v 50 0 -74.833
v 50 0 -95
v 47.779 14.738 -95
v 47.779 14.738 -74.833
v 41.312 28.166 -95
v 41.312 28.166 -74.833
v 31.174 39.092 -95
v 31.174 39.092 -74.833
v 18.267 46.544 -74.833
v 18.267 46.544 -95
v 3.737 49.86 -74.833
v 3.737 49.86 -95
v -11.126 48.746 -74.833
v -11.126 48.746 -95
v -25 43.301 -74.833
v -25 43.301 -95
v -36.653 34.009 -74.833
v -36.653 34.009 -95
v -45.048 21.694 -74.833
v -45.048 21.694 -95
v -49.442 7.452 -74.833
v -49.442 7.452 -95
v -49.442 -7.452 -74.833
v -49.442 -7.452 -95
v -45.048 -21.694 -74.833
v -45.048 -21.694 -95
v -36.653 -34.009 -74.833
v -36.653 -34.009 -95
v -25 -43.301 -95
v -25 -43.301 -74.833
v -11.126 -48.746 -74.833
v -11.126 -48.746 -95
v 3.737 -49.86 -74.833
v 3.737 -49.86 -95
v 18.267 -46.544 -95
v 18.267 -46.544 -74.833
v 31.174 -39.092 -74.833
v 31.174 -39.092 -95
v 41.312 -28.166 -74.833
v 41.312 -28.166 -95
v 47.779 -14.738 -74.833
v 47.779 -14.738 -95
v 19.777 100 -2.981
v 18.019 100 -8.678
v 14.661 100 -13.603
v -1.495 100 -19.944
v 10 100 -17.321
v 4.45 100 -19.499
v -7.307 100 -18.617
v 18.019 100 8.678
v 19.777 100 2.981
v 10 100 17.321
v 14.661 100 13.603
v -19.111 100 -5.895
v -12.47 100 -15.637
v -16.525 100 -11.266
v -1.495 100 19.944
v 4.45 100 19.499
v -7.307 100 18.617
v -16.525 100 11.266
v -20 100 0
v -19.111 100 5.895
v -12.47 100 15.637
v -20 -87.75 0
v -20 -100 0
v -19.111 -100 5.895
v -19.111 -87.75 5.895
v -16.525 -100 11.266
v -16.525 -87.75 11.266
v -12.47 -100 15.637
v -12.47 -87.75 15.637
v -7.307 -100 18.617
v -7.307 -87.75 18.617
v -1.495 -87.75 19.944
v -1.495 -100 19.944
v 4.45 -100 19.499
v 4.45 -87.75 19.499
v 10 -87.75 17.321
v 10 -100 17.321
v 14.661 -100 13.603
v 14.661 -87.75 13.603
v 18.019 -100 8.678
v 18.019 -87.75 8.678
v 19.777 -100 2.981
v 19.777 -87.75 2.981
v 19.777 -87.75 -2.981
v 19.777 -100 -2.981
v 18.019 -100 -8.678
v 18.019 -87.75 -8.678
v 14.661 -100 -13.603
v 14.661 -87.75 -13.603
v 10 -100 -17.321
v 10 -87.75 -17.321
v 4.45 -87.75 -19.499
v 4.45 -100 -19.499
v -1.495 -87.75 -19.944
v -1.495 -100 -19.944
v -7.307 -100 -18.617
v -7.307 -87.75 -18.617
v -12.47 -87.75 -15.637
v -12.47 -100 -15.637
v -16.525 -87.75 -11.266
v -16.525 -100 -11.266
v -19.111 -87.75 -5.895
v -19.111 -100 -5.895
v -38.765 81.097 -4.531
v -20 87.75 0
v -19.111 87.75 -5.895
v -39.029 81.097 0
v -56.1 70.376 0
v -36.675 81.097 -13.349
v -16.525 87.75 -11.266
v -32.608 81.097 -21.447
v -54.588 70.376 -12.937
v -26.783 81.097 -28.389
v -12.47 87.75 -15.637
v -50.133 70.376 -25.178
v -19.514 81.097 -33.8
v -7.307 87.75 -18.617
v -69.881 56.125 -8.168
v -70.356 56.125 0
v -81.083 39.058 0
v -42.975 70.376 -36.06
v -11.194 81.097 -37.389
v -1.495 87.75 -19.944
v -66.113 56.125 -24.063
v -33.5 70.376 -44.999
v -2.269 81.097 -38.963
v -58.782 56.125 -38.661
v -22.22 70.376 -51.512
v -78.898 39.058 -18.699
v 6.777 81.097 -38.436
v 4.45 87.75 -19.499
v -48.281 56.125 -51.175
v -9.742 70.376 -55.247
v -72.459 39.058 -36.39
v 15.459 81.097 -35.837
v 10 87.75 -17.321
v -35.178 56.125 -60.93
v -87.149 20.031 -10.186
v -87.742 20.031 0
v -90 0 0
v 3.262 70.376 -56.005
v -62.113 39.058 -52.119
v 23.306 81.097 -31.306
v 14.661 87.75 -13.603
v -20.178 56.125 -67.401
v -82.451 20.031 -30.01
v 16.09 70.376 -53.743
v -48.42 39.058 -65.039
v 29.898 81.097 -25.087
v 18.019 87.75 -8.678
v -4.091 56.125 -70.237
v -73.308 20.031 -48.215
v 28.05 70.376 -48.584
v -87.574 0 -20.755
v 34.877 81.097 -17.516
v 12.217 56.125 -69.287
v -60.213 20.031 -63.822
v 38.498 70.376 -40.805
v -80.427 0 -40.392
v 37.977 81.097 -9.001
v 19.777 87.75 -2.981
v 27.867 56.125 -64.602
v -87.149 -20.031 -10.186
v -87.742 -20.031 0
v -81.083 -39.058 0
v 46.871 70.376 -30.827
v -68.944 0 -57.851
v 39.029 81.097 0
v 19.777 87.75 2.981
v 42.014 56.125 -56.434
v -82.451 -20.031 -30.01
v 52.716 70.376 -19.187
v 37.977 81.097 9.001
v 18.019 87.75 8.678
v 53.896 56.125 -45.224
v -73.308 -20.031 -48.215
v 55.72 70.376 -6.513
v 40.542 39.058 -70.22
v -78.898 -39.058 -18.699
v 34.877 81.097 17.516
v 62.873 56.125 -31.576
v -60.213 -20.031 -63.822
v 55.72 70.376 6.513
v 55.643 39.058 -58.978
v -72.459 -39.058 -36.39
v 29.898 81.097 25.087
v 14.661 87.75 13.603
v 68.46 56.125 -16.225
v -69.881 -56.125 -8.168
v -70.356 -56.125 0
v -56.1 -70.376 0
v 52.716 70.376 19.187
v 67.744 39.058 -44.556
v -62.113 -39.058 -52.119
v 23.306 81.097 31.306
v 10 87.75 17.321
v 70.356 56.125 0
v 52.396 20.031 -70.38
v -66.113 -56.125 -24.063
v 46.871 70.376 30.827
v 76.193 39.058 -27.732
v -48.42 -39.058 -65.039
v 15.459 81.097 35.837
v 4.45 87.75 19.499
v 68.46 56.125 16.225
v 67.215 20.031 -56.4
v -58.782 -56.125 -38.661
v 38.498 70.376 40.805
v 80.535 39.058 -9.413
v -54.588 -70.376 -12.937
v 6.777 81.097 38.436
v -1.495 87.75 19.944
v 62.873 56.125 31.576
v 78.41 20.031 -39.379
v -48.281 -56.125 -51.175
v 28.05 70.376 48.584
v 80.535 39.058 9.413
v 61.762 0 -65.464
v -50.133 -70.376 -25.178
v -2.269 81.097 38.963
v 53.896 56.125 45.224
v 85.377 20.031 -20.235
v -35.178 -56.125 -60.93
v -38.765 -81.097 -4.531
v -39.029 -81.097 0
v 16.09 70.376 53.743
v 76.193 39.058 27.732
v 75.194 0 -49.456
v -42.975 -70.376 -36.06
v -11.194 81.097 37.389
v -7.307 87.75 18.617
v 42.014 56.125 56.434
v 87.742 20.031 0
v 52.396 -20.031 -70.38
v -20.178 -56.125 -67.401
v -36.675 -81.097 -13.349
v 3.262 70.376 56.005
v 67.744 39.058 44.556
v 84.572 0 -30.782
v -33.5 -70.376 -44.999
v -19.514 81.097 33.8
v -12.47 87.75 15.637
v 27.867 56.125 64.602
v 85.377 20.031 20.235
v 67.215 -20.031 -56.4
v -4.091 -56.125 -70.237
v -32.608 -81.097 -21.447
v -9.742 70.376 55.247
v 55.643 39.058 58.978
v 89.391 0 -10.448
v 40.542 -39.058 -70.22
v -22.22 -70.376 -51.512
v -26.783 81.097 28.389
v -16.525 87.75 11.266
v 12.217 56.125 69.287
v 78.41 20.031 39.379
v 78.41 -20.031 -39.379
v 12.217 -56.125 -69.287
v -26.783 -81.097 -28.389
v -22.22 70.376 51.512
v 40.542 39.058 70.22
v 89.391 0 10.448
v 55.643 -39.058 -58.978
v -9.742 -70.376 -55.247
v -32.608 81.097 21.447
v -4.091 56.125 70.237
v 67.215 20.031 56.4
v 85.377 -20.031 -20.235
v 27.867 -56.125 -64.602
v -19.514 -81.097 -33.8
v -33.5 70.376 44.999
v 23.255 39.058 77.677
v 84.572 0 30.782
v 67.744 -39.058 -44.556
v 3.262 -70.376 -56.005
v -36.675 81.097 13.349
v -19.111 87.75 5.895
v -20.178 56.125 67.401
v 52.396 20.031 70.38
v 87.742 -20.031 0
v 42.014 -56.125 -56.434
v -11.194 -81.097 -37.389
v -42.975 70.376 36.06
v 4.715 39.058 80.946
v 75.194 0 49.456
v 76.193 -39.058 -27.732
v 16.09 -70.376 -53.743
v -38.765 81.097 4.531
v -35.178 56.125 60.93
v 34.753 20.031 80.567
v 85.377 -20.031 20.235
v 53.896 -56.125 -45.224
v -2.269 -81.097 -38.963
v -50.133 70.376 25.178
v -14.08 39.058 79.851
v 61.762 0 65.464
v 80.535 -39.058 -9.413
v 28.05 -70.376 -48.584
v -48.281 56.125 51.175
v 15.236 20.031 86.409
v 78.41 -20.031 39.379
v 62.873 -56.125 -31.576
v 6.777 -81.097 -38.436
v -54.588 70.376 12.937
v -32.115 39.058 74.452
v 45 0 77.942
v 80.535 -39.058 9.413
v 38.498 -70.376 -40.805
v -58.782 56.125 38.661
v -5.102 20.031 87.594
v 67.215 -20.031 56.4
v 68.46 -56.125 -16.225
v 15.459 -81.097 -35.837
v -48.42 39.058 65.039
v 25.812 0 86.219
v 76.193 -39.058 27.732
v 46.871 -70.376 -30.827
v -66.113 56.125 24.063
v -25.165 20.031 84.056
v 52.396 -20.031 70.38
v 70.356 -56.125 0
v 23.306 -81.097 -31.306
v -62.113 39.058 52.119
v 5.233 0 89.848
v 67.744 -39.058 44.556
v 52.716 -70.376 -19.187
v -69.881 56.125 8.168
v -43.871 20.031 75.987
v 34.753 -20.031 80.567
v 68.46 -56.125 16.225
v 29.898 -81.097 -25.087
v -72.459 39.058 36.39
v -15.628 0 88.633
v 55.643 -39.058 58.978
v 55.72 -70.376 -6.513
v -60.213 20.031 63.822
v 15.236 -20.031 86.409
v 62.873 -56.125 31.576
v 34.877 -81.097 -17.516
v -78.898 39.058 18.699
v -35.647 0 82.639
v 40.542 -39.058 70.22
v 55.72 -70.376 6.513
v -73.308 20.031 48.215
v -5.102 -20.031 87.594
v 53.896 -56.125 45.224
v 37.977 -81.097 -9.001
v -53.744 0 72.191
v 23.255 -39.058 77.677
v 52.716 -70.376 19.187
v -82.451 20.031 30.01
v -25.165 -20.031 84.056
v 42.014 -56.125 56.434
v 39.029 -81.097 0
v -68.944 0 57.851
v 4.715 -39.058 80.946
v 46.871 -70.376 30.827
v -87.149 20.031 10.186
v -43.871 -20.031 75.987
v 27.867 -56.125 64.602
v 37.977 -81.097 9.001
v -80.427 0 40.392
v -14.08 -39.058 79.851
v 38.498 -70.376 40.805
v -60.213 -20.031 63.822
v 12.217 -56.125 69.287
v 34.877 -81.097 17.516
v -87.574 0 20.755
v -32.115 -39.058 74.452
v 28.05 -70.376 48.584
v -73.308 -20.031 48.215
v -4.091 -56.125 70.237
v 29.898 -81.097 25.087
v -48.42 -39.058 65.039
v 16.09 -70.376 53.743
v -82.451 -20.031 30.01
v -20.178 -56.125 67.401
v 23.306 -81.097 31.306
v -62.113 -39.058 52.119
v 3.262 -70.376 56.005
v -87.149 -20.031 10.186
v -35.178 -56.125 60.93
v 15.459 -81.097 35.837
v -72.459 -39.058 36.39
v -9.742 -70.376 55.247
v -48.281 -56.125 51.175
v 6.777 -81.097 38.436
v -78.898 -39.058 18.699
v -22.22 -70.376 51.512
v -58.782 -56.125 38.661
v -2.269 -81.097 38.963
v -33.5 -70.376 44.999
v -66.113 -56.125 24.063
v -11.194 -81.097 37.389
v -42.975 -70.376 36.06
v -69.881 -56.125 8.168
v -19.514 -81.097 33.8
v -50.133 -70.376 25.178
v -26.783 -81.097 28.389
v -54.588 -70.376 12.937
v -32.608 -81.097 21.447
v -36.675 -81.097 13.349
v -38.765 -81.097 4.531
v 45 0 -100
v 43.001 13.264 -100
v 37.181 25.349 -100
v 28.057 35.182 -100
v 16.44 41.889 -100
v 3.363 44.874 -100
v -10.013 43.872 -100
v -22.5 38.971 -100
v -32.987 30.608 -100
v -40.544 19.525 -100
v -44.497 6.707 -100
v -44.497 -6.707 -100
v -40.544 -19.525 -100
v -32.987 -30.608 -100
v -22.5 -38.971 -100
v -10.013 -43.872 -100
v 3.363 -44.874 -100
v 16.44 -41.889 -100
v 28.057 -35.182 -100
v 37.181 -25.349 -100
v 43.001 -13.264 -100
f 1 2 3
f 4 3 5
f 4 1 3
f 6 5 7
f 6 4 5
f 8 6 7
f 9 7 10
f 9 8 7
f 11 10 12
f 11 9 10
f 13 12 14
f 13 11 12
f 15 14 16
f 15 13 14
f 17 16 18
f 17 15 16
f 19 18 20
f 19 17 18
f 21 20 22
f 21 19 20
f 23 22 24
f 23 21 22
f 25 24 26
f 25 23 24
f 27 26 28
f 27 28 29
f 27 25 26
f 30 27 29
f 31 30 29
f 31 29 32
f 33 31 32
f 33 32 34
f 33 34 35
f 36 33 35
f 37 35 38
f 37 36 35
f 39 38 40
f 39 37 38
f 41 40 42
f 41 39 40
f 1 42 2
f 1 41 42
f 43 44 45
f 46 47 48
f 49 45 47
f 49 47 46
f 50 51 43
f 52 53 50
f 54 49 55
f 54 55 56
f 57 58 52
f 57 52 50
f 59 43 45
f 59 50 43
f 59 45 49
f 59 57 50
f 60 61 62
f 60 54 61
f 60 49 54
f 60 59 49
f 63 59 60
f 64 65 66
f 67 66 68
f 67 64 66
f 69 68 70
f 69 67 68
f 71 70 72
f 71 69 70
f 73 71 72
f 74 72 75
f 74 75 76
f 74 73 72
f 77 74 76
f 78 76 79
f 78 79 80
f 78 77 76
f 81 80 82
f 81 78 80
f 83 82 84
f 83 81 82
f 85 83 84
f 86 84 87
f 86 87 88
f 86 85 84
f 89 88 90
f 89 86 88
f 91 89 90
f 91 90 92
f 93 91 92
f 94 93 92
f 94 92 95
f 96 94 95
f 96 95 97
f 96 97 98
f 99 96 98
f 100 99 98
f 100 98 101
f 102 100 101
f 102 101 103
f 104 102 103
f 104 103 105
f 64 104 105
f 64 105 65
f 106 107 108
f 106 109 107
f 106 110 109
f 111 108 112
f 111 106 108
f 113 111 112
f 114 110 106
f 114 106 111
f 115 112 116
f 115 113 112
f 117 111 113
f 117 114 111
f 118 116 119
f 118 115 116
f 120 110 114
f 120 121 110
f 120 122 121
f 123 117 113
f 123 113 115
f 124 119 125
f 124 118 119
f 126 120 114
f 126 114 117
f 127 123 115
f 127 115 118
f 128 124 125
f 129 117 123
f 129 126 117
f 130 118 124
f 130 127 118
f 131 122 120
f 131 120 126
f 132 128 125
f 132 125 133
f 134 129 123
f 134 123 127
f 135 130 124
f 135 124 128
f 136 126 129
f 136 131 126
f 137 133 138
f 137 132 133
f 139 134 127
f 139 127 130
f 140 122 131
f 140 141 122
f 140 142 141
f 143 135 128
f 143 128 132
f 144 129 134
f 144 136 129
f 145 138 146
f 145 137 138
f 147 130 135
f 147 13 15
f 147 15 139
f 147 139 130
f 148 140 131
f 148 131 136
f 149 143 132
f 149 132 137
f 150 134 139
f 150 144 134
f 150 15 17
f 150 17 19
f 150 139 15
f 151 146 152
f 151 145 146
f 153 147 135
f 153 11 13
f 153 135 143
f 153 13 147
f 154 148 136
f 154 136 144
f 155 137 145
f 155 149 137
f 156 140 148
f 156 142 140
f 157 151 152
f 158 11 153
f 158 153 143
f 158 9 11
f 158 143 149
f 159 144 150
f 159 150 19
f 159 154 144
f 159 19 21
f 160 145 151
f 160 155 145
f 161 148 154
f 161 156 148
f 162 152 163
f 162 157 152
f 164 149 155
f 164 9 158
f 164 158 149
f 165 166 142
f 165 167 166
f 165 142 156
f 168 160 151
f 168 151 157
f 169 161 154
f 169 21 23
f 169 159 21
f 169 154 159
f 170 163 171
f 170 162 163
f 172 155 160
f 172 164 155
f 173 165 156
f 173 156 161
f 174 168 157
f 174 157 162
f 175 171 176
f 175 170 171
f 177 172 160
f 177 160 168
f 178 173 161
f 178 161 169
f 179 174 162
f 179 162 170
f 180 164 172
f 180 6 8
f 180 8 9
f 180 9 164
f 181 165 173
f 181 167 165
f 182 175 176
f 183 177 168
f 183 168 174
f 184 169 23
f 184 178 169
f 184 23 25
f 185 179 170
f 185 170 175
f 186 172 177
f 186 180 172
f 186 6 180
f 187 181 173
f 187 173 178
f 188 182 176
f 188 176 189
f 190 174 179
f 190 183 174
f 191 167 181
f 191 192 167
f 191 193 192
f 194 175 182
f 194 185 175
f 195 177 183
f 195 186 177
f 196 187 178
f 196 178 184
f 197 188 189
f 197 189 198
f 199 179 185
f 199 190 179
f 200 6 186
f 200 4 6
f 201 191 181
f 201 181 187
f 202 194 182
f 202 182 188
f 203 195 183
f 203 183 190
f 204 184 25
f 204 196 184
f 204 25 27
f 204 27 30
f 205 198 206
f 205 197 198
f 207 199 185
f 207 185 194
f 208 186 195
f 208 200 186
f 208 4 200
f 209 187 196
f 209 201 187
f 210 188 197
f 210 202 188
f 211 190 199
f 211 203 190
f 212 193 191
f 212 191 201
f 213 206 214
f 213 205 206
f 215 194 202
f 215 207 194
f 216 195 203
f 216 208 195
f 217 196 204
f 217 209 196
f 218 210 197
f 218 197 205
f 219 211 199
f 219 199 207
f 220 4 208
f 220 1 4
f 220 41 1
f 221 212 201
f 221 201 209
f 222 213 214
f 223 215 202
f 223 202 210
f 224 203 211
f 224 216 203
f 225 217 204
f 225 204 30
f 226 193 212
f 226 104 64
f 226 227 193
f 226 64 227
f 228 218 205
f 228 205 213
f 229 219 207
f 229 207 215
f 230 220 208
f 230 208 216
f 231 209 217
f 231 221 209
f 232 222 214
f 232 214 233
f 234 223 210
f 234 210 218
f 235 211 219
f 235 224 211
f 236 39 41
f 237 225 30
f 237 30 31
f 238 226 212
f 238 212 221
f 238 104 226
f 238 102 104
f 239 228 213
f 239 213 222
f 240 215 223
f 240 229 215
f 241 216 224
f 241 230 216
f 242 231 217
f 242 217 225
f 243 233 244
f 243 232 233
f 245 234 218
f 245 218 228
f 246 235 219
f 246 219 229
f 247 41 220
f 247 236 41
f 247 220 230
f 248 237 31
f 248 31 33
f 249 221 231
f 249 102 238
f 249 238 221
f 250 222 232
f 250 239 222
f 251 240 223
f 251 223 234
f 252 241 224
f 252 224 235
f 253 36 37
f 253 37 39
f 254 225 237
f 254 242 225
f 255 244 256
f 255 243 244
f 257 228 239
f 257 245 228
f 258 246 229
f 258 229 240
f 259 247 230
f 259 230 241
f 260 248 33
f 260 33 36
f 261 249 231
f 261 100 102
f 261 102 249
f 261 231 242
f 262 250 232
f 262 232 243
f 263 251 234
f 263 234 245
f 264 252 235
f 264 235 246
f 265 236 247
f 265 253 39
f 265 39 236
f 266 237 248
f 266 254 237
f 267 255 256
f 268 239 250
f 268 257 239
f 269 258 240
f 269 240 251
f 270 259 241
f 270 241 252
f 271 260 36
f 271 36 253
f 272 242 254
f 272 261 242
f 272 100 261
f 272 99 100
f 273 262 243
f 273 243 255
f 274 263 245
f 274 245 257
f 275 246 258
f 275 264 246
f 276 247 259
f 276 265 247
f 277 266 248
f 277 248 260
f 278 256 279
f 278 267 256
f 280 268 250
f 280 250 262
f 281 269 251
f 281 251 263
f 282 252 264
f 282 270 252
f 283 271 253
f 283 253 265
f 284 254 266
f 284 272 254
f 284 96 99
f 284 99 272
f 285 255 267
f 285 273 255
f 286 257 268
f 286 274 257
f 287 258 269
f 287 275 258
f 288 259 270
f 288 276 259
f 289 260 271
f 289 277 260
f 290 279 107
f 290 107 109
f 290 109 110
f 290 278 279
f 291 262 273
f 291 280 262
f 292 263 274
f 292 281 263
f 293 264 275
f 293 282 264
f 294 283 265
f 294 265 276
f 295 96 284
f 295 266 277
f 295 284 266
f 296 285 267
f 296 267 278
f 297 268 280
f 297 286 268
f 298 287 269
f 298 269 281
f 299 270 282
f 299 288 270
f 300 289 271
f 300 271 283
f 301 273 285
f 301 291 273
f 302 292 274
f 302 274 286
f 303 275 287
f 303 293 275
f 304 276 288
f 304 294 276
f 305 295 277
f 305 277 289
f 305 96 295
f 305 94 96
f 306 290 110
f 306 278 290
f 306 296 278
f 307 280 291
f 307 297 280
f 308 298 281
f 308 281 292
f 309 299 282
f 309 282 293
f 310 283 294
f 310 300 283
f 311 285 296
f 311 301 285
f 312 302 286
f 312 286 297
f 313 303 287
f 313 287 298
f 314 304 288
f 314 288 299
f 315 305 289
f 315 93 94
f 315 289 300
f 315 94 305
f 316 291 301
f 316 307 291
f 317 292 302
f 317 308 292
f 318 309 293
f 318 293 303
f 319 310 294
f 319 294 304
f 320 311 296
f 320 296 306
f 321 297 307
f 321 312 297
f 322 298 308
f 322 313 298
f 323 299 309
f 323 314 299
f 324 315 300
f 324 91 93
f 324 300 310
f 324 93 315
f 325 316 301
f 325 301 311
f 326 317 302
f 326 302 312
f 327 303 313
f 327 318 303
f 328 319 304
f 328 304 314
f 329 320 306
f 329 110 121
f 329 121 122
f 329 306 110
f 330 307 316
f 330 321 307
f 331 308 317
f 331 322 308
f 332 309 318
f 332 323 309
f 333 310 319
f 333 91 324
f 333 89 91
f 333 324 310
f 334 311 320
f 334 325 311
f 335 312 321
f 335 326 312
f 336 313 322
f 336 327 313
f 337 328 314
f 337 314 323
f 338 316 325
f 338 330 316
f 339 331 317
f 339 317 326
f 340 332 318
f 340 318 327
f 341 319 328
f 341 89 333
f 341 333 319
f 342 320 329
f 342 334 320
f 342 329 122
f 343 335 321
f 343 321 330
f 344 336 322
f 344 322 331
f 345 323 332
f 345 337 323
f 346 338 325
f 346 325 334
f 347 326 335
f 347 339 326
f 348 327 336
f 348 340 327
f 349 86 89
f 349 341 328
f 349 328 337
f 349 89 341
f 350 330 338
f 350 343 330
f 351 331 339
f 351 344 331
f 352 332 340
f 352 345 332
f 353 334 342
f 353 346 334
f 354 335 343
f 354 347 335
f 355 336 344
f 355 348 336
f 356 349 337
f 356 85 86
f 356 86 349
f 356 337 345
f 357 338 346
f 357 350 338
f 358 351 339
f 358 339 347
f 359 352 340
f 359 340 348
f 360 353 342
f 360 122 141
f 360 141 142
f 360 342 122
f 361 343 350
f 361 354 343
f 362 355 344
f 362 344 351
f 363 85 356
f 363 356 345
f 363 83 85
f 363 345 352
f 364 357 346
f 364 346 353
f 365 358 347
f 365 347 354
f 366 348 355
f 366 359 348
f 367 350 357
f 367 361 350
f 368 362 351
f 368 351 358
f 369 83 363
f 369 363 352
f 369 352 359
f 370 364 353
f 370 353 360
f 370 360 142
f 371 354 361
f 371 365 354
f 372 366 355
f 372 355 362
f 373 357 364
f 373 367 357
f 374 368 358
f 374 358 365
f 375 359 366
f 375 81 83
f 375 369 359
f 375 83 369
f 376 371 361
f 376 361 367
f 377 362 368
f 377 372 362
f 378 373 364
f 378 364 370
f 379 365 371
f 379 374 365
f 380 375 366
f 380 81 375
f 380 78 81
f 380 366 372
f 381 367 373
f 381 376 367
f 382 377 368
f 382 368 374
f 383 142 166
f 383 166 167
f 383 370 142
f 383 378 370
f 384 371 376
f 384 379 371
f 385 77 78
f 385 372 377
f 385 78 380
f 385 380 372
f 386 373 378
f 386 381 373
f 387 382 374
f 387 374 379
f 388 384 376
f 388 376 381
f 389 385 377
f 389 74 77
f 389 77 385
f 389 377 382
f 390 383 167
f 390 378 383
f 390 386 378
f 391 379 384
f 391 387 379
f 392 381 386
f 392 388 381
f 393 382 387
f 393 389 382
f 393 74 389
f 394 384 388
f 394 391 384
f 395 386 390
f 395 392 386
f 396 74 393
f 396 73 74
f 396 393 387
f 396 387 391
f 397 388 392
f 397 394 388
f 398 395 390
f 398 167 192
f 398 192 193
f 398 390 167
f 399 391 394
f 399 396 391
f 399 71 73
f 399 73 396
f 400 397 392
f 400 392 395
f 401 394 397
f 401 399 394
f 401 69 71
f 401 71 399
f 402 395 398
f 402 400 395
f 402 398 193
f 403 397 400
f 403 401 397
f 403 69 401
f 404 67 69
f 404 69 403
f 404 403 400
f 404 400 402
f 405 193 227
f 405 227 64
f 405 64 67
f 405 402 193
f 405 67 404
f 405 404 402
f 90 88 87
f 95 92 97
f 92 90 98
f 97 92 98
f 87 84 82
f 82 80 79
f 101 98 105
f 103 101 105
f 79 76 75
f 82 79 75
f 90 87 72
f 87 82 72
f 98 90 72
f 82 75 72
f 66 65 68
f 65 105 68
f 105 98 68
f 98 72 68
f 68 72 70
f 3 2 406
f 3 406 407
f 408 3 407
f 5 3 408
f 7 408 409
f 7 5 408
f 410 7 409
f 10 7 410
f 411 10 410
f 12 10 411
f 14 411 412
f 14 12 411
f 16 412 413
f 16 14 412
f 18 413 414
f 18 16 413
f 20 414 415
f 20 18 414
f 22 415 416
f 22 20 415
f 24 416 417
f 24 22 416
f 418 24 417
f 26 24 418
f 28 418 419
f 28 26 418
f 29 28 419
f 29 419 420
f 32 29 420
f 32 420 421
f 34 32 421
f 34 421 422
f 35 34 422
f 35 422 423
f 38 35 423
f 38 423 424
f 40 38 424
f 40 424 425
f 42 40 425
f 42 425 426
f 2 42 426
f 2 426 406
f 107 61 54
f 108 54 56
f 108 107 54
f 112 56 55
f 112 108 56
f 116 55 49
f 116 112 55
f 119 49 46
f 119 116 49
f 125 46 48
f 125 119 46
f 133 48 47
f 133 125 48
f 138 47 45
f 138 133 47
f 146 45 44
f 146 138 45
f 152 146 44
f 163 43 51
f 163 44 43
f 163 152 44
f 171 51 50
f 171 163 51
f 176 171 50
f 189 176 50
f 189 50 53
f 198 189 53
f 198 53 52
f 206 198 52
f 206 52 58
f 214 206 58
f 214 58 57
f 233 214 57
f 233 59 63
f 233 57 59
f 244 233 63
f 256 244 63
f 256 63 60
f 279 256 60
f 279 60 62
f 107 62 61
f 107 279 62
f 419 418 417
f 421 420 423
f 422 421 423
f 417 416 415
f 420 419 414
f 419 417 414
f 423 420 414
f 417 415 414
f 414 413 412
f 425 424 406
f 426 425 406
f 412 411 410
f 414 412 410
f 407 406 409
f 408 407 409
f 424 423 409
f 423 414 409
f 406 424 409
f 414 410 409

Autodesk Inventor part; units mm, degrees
ref_plane "YZ Plane" through (0, 0, 0) normal (1, 0, 0) x (0, 1, 0)
sketch "スケッチ1" plane through (0, 0, 0) normal (0, 0, 1) x (1, 0, 0)
  arc A0 (0, 90) -> (0, -90) centre (0, 0) ccw
  line L0 (0, 90) -> (0, -90)
  dimension "d0" = 180
revolve "回転1" add sketch "スケッチ1" angle 360 about axis through (0, 90, 0) along (0, -1, 0)
sketch "スケッチ2" plane through (0, 0, 0) normal (0, 1, 0) x (-1, 0, 0)
  circle A0 centre (0, 0) radius 20
  dimension "d2" = 40
extrude "押し出し1" add sketch "スケッチ2" along normal mid plane 200
sketch "スケッチ3" plane through (0, 0, 0) normal (0, 0, 1) x (1, 0, 0)
  circle A0 centre (0, 0) radius 50
  dimension "d5" = 100
extrude "押し出し2" add sketch "スケッチ3" against normal blind 100
chamfer "面取り1" distance 5 angle 45 1 edges at (-50, 0, -100)
properties part number "ChestY"
